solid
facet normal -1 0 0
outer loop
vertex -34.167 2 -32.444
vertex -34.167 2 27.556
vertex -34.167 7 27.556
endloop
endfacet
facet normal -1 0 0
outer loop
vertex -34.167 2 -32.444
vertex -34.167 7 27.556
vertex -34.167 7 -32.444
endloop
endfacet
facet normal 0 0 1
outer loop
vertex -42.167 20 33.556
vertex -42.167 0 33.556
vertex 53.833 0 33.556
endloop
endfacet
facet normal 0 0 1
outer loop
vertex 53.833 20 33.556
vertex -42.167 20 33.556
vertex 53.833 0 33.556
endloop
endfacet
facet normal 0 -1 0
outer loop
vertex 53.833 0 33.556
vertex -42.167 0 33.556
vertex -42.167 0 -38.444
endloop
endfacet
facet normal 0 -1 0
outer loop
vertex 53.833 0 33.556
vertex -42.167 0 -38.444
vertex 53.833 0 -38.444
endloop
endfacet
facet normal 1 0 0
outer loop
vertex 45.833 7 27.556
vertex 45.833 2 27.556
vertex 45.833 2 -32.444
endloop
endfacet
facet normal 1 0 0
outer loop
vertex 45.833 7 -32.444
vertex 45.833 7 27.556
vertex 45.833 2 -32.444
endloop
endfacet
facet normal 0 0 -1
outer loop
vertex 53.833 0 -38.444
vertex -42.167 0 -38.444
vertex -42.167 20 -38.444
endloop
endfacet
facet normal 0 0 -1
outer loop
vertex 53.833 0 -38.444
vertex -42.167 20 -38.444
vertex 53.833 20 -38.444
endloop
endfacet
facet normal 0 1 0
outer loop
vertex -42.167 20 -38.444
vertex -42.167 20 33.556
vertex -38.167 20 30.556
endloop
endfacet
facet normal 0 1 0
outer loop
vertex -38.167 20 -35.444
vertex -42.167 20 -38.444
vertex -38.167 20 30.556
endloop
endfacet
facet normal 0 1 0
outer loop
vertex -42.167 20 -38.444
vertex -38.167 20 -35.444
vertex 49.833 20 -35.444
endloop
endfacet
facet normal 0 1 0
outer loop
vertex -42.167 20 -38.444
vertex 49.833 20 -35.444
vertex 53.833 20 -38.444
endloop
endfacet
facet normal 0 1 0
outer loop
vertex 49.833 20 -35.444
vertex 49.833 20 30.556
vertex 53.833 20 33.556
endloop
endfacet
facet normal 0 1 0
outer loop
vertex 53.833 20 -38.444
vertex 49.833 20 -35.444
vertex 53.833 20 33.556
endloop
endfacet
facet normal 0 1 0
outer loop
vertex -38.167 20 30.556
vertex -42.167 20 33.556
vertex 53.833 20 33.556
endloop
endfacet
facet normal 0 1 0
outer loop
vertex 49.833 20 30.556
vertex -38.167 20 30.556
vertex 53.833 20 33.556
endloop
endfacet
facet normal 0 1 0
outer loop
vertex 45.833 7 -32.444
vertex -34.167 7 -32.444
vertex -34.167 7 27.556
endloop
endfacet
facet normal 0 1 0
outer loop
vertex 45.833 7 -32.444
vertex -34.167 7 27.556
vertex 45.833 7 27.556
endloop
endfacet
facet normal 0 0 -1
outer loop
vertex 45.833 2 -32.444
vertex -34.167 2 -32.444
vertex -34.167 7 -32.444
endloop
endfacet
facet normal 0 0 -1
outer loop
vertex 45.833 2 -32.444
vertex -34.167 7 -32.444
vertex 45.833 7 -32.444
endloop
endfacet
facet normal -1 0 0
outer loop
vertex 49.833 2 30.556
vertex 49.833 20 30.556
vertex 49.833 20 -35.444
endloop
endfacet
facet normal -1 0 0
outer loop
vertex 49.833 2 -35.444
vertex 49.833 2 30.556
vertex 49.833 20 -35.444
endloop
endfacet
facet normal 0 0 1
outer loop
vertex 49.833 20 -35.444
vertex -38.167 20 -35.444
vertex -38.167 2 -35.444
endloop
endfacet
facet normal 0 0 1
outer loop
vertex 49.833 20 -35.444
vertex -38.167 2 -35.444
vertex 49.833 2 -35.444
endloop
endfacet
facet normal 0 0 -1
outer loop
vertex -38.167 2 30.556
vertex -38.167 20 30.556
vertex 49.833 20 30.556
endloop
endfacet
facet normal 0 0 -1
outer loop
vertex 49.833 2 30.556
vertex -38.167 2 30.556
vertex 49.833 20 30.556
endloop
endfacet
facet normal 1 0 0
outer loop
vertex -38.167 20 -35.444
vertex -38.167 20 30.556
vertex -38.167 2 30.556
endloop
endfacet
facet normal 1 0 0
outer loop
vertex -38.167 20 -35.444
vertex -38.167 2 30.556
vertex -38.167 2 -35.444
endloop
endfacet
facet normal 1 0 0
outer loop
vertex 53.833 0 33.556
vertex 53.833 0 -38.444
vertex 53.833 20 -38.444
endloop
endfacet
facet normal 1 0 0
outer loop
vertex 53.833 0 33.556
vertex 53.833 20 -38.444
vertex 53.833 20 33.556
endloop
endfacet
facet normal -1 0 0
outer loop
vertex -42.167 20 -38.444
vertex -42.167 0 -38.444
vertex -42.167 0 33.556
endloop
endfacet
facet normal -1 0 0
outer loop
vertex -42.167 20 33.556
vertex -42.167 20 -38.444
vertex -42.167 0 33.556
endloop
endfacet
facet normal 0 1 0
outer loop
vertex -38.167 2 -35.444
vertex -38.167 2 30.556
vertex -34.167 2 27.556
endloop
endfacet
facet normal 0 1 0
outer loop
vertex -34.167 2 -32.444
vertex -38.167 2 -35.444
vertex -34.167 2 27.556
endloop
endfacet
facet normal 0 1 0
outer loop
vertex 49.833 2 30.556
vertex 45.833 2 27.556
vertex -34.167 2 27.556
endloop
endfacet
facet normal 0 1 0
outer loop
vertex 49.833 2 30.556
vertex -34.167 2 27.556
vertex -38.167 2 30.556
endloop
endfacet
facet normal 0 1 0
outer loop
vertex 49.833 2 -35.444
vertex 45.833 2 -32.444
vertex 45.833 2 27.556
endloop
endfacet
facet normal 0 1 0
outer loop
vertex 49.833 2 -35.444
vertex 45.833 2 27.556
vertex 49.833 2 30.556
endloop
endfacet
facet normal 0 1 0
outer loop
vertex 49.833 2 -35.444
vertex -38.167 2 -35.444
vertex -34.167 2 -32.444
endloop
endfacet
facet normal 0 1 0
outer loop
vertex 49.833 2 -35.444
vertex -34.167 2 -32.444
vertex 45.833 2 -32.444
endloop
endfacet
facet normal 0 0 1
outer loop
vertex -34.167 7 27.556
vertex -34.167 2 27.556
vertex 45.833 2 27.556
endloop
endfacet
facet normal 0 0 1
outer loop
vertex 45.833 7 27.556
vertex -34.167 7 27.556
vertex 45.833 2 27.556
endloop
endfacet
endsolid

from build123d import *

# Parameters (mm, degrees)
SKETCH_1_W          = 80
SKETCH_1_H          = 60
EXTRUDE_1_DEPTH     = 5
SKETCH_2_W          = 96
SKETCH_2_H          = 72
EXTRUDE_2_DEPTH     = 20
SKETCH_3_W          = 88
SKETCH_3_H          = 66
CUT_EXTRUDE_1_DEPTH = 18
SKETCH_5_W          = 80
SKETCH_5_H          = 60
EXTRUDE_3_DEPTH     = 5


with BuildPart() as part:
    # 草图1 → 凸台-拉伸1 (new body)
    with BuildSketch(Plane(origin=(0, 0, 0), x_dir=(1, 0, 0), z_dir=(0, 1, 0))):
        with Locations((5.833333333, 4.444444444)):
            Rectangle(SKETCH_1_W, SKETCH_1_H)
    extrude(amount=EXTRUDE_1_DEPTH)

    # 草图2 → 凸台-拉伸2 (add)
    with BuildSketch(Plane.XZ):
        with Locations((5.833333333, -2.444444444)):
            Rectangle(SKETCH_2_W, SKETCH_2_H)
    extrude(amount=-EXTRUDE_2_DEPTH)

    # 草图3 → 切除-拉伸1 (cut)
    with BuildSketch(Plane(origin=(0, 20, 0), x_dir=(1, 0, 0), z_dir=(0, 1, 0))):
        with Locations((5.833333333, 2.444444444)):
            Rectangle(SKETCH_3_W, SKETCH_3_H)
    extrude(amount=-CUT_EXTRUDE_1_DEPTH, mode=Mode.SUBTRACT)

    # 草图5 → 凸台-拉伸3 (add)
    with BuildSketch(Plane(origin=(0, 2, 0), x_dir=(1, 0, 0), z_dir=(0, 1, 0))):
        with Locations((5.833333333, 2.444444444)):
            Rectangle(SKETCH_5_W, SKETCH_5_H)
    extrude(amount=EXTRUDE_3_DEPTH)


solid = part.part
